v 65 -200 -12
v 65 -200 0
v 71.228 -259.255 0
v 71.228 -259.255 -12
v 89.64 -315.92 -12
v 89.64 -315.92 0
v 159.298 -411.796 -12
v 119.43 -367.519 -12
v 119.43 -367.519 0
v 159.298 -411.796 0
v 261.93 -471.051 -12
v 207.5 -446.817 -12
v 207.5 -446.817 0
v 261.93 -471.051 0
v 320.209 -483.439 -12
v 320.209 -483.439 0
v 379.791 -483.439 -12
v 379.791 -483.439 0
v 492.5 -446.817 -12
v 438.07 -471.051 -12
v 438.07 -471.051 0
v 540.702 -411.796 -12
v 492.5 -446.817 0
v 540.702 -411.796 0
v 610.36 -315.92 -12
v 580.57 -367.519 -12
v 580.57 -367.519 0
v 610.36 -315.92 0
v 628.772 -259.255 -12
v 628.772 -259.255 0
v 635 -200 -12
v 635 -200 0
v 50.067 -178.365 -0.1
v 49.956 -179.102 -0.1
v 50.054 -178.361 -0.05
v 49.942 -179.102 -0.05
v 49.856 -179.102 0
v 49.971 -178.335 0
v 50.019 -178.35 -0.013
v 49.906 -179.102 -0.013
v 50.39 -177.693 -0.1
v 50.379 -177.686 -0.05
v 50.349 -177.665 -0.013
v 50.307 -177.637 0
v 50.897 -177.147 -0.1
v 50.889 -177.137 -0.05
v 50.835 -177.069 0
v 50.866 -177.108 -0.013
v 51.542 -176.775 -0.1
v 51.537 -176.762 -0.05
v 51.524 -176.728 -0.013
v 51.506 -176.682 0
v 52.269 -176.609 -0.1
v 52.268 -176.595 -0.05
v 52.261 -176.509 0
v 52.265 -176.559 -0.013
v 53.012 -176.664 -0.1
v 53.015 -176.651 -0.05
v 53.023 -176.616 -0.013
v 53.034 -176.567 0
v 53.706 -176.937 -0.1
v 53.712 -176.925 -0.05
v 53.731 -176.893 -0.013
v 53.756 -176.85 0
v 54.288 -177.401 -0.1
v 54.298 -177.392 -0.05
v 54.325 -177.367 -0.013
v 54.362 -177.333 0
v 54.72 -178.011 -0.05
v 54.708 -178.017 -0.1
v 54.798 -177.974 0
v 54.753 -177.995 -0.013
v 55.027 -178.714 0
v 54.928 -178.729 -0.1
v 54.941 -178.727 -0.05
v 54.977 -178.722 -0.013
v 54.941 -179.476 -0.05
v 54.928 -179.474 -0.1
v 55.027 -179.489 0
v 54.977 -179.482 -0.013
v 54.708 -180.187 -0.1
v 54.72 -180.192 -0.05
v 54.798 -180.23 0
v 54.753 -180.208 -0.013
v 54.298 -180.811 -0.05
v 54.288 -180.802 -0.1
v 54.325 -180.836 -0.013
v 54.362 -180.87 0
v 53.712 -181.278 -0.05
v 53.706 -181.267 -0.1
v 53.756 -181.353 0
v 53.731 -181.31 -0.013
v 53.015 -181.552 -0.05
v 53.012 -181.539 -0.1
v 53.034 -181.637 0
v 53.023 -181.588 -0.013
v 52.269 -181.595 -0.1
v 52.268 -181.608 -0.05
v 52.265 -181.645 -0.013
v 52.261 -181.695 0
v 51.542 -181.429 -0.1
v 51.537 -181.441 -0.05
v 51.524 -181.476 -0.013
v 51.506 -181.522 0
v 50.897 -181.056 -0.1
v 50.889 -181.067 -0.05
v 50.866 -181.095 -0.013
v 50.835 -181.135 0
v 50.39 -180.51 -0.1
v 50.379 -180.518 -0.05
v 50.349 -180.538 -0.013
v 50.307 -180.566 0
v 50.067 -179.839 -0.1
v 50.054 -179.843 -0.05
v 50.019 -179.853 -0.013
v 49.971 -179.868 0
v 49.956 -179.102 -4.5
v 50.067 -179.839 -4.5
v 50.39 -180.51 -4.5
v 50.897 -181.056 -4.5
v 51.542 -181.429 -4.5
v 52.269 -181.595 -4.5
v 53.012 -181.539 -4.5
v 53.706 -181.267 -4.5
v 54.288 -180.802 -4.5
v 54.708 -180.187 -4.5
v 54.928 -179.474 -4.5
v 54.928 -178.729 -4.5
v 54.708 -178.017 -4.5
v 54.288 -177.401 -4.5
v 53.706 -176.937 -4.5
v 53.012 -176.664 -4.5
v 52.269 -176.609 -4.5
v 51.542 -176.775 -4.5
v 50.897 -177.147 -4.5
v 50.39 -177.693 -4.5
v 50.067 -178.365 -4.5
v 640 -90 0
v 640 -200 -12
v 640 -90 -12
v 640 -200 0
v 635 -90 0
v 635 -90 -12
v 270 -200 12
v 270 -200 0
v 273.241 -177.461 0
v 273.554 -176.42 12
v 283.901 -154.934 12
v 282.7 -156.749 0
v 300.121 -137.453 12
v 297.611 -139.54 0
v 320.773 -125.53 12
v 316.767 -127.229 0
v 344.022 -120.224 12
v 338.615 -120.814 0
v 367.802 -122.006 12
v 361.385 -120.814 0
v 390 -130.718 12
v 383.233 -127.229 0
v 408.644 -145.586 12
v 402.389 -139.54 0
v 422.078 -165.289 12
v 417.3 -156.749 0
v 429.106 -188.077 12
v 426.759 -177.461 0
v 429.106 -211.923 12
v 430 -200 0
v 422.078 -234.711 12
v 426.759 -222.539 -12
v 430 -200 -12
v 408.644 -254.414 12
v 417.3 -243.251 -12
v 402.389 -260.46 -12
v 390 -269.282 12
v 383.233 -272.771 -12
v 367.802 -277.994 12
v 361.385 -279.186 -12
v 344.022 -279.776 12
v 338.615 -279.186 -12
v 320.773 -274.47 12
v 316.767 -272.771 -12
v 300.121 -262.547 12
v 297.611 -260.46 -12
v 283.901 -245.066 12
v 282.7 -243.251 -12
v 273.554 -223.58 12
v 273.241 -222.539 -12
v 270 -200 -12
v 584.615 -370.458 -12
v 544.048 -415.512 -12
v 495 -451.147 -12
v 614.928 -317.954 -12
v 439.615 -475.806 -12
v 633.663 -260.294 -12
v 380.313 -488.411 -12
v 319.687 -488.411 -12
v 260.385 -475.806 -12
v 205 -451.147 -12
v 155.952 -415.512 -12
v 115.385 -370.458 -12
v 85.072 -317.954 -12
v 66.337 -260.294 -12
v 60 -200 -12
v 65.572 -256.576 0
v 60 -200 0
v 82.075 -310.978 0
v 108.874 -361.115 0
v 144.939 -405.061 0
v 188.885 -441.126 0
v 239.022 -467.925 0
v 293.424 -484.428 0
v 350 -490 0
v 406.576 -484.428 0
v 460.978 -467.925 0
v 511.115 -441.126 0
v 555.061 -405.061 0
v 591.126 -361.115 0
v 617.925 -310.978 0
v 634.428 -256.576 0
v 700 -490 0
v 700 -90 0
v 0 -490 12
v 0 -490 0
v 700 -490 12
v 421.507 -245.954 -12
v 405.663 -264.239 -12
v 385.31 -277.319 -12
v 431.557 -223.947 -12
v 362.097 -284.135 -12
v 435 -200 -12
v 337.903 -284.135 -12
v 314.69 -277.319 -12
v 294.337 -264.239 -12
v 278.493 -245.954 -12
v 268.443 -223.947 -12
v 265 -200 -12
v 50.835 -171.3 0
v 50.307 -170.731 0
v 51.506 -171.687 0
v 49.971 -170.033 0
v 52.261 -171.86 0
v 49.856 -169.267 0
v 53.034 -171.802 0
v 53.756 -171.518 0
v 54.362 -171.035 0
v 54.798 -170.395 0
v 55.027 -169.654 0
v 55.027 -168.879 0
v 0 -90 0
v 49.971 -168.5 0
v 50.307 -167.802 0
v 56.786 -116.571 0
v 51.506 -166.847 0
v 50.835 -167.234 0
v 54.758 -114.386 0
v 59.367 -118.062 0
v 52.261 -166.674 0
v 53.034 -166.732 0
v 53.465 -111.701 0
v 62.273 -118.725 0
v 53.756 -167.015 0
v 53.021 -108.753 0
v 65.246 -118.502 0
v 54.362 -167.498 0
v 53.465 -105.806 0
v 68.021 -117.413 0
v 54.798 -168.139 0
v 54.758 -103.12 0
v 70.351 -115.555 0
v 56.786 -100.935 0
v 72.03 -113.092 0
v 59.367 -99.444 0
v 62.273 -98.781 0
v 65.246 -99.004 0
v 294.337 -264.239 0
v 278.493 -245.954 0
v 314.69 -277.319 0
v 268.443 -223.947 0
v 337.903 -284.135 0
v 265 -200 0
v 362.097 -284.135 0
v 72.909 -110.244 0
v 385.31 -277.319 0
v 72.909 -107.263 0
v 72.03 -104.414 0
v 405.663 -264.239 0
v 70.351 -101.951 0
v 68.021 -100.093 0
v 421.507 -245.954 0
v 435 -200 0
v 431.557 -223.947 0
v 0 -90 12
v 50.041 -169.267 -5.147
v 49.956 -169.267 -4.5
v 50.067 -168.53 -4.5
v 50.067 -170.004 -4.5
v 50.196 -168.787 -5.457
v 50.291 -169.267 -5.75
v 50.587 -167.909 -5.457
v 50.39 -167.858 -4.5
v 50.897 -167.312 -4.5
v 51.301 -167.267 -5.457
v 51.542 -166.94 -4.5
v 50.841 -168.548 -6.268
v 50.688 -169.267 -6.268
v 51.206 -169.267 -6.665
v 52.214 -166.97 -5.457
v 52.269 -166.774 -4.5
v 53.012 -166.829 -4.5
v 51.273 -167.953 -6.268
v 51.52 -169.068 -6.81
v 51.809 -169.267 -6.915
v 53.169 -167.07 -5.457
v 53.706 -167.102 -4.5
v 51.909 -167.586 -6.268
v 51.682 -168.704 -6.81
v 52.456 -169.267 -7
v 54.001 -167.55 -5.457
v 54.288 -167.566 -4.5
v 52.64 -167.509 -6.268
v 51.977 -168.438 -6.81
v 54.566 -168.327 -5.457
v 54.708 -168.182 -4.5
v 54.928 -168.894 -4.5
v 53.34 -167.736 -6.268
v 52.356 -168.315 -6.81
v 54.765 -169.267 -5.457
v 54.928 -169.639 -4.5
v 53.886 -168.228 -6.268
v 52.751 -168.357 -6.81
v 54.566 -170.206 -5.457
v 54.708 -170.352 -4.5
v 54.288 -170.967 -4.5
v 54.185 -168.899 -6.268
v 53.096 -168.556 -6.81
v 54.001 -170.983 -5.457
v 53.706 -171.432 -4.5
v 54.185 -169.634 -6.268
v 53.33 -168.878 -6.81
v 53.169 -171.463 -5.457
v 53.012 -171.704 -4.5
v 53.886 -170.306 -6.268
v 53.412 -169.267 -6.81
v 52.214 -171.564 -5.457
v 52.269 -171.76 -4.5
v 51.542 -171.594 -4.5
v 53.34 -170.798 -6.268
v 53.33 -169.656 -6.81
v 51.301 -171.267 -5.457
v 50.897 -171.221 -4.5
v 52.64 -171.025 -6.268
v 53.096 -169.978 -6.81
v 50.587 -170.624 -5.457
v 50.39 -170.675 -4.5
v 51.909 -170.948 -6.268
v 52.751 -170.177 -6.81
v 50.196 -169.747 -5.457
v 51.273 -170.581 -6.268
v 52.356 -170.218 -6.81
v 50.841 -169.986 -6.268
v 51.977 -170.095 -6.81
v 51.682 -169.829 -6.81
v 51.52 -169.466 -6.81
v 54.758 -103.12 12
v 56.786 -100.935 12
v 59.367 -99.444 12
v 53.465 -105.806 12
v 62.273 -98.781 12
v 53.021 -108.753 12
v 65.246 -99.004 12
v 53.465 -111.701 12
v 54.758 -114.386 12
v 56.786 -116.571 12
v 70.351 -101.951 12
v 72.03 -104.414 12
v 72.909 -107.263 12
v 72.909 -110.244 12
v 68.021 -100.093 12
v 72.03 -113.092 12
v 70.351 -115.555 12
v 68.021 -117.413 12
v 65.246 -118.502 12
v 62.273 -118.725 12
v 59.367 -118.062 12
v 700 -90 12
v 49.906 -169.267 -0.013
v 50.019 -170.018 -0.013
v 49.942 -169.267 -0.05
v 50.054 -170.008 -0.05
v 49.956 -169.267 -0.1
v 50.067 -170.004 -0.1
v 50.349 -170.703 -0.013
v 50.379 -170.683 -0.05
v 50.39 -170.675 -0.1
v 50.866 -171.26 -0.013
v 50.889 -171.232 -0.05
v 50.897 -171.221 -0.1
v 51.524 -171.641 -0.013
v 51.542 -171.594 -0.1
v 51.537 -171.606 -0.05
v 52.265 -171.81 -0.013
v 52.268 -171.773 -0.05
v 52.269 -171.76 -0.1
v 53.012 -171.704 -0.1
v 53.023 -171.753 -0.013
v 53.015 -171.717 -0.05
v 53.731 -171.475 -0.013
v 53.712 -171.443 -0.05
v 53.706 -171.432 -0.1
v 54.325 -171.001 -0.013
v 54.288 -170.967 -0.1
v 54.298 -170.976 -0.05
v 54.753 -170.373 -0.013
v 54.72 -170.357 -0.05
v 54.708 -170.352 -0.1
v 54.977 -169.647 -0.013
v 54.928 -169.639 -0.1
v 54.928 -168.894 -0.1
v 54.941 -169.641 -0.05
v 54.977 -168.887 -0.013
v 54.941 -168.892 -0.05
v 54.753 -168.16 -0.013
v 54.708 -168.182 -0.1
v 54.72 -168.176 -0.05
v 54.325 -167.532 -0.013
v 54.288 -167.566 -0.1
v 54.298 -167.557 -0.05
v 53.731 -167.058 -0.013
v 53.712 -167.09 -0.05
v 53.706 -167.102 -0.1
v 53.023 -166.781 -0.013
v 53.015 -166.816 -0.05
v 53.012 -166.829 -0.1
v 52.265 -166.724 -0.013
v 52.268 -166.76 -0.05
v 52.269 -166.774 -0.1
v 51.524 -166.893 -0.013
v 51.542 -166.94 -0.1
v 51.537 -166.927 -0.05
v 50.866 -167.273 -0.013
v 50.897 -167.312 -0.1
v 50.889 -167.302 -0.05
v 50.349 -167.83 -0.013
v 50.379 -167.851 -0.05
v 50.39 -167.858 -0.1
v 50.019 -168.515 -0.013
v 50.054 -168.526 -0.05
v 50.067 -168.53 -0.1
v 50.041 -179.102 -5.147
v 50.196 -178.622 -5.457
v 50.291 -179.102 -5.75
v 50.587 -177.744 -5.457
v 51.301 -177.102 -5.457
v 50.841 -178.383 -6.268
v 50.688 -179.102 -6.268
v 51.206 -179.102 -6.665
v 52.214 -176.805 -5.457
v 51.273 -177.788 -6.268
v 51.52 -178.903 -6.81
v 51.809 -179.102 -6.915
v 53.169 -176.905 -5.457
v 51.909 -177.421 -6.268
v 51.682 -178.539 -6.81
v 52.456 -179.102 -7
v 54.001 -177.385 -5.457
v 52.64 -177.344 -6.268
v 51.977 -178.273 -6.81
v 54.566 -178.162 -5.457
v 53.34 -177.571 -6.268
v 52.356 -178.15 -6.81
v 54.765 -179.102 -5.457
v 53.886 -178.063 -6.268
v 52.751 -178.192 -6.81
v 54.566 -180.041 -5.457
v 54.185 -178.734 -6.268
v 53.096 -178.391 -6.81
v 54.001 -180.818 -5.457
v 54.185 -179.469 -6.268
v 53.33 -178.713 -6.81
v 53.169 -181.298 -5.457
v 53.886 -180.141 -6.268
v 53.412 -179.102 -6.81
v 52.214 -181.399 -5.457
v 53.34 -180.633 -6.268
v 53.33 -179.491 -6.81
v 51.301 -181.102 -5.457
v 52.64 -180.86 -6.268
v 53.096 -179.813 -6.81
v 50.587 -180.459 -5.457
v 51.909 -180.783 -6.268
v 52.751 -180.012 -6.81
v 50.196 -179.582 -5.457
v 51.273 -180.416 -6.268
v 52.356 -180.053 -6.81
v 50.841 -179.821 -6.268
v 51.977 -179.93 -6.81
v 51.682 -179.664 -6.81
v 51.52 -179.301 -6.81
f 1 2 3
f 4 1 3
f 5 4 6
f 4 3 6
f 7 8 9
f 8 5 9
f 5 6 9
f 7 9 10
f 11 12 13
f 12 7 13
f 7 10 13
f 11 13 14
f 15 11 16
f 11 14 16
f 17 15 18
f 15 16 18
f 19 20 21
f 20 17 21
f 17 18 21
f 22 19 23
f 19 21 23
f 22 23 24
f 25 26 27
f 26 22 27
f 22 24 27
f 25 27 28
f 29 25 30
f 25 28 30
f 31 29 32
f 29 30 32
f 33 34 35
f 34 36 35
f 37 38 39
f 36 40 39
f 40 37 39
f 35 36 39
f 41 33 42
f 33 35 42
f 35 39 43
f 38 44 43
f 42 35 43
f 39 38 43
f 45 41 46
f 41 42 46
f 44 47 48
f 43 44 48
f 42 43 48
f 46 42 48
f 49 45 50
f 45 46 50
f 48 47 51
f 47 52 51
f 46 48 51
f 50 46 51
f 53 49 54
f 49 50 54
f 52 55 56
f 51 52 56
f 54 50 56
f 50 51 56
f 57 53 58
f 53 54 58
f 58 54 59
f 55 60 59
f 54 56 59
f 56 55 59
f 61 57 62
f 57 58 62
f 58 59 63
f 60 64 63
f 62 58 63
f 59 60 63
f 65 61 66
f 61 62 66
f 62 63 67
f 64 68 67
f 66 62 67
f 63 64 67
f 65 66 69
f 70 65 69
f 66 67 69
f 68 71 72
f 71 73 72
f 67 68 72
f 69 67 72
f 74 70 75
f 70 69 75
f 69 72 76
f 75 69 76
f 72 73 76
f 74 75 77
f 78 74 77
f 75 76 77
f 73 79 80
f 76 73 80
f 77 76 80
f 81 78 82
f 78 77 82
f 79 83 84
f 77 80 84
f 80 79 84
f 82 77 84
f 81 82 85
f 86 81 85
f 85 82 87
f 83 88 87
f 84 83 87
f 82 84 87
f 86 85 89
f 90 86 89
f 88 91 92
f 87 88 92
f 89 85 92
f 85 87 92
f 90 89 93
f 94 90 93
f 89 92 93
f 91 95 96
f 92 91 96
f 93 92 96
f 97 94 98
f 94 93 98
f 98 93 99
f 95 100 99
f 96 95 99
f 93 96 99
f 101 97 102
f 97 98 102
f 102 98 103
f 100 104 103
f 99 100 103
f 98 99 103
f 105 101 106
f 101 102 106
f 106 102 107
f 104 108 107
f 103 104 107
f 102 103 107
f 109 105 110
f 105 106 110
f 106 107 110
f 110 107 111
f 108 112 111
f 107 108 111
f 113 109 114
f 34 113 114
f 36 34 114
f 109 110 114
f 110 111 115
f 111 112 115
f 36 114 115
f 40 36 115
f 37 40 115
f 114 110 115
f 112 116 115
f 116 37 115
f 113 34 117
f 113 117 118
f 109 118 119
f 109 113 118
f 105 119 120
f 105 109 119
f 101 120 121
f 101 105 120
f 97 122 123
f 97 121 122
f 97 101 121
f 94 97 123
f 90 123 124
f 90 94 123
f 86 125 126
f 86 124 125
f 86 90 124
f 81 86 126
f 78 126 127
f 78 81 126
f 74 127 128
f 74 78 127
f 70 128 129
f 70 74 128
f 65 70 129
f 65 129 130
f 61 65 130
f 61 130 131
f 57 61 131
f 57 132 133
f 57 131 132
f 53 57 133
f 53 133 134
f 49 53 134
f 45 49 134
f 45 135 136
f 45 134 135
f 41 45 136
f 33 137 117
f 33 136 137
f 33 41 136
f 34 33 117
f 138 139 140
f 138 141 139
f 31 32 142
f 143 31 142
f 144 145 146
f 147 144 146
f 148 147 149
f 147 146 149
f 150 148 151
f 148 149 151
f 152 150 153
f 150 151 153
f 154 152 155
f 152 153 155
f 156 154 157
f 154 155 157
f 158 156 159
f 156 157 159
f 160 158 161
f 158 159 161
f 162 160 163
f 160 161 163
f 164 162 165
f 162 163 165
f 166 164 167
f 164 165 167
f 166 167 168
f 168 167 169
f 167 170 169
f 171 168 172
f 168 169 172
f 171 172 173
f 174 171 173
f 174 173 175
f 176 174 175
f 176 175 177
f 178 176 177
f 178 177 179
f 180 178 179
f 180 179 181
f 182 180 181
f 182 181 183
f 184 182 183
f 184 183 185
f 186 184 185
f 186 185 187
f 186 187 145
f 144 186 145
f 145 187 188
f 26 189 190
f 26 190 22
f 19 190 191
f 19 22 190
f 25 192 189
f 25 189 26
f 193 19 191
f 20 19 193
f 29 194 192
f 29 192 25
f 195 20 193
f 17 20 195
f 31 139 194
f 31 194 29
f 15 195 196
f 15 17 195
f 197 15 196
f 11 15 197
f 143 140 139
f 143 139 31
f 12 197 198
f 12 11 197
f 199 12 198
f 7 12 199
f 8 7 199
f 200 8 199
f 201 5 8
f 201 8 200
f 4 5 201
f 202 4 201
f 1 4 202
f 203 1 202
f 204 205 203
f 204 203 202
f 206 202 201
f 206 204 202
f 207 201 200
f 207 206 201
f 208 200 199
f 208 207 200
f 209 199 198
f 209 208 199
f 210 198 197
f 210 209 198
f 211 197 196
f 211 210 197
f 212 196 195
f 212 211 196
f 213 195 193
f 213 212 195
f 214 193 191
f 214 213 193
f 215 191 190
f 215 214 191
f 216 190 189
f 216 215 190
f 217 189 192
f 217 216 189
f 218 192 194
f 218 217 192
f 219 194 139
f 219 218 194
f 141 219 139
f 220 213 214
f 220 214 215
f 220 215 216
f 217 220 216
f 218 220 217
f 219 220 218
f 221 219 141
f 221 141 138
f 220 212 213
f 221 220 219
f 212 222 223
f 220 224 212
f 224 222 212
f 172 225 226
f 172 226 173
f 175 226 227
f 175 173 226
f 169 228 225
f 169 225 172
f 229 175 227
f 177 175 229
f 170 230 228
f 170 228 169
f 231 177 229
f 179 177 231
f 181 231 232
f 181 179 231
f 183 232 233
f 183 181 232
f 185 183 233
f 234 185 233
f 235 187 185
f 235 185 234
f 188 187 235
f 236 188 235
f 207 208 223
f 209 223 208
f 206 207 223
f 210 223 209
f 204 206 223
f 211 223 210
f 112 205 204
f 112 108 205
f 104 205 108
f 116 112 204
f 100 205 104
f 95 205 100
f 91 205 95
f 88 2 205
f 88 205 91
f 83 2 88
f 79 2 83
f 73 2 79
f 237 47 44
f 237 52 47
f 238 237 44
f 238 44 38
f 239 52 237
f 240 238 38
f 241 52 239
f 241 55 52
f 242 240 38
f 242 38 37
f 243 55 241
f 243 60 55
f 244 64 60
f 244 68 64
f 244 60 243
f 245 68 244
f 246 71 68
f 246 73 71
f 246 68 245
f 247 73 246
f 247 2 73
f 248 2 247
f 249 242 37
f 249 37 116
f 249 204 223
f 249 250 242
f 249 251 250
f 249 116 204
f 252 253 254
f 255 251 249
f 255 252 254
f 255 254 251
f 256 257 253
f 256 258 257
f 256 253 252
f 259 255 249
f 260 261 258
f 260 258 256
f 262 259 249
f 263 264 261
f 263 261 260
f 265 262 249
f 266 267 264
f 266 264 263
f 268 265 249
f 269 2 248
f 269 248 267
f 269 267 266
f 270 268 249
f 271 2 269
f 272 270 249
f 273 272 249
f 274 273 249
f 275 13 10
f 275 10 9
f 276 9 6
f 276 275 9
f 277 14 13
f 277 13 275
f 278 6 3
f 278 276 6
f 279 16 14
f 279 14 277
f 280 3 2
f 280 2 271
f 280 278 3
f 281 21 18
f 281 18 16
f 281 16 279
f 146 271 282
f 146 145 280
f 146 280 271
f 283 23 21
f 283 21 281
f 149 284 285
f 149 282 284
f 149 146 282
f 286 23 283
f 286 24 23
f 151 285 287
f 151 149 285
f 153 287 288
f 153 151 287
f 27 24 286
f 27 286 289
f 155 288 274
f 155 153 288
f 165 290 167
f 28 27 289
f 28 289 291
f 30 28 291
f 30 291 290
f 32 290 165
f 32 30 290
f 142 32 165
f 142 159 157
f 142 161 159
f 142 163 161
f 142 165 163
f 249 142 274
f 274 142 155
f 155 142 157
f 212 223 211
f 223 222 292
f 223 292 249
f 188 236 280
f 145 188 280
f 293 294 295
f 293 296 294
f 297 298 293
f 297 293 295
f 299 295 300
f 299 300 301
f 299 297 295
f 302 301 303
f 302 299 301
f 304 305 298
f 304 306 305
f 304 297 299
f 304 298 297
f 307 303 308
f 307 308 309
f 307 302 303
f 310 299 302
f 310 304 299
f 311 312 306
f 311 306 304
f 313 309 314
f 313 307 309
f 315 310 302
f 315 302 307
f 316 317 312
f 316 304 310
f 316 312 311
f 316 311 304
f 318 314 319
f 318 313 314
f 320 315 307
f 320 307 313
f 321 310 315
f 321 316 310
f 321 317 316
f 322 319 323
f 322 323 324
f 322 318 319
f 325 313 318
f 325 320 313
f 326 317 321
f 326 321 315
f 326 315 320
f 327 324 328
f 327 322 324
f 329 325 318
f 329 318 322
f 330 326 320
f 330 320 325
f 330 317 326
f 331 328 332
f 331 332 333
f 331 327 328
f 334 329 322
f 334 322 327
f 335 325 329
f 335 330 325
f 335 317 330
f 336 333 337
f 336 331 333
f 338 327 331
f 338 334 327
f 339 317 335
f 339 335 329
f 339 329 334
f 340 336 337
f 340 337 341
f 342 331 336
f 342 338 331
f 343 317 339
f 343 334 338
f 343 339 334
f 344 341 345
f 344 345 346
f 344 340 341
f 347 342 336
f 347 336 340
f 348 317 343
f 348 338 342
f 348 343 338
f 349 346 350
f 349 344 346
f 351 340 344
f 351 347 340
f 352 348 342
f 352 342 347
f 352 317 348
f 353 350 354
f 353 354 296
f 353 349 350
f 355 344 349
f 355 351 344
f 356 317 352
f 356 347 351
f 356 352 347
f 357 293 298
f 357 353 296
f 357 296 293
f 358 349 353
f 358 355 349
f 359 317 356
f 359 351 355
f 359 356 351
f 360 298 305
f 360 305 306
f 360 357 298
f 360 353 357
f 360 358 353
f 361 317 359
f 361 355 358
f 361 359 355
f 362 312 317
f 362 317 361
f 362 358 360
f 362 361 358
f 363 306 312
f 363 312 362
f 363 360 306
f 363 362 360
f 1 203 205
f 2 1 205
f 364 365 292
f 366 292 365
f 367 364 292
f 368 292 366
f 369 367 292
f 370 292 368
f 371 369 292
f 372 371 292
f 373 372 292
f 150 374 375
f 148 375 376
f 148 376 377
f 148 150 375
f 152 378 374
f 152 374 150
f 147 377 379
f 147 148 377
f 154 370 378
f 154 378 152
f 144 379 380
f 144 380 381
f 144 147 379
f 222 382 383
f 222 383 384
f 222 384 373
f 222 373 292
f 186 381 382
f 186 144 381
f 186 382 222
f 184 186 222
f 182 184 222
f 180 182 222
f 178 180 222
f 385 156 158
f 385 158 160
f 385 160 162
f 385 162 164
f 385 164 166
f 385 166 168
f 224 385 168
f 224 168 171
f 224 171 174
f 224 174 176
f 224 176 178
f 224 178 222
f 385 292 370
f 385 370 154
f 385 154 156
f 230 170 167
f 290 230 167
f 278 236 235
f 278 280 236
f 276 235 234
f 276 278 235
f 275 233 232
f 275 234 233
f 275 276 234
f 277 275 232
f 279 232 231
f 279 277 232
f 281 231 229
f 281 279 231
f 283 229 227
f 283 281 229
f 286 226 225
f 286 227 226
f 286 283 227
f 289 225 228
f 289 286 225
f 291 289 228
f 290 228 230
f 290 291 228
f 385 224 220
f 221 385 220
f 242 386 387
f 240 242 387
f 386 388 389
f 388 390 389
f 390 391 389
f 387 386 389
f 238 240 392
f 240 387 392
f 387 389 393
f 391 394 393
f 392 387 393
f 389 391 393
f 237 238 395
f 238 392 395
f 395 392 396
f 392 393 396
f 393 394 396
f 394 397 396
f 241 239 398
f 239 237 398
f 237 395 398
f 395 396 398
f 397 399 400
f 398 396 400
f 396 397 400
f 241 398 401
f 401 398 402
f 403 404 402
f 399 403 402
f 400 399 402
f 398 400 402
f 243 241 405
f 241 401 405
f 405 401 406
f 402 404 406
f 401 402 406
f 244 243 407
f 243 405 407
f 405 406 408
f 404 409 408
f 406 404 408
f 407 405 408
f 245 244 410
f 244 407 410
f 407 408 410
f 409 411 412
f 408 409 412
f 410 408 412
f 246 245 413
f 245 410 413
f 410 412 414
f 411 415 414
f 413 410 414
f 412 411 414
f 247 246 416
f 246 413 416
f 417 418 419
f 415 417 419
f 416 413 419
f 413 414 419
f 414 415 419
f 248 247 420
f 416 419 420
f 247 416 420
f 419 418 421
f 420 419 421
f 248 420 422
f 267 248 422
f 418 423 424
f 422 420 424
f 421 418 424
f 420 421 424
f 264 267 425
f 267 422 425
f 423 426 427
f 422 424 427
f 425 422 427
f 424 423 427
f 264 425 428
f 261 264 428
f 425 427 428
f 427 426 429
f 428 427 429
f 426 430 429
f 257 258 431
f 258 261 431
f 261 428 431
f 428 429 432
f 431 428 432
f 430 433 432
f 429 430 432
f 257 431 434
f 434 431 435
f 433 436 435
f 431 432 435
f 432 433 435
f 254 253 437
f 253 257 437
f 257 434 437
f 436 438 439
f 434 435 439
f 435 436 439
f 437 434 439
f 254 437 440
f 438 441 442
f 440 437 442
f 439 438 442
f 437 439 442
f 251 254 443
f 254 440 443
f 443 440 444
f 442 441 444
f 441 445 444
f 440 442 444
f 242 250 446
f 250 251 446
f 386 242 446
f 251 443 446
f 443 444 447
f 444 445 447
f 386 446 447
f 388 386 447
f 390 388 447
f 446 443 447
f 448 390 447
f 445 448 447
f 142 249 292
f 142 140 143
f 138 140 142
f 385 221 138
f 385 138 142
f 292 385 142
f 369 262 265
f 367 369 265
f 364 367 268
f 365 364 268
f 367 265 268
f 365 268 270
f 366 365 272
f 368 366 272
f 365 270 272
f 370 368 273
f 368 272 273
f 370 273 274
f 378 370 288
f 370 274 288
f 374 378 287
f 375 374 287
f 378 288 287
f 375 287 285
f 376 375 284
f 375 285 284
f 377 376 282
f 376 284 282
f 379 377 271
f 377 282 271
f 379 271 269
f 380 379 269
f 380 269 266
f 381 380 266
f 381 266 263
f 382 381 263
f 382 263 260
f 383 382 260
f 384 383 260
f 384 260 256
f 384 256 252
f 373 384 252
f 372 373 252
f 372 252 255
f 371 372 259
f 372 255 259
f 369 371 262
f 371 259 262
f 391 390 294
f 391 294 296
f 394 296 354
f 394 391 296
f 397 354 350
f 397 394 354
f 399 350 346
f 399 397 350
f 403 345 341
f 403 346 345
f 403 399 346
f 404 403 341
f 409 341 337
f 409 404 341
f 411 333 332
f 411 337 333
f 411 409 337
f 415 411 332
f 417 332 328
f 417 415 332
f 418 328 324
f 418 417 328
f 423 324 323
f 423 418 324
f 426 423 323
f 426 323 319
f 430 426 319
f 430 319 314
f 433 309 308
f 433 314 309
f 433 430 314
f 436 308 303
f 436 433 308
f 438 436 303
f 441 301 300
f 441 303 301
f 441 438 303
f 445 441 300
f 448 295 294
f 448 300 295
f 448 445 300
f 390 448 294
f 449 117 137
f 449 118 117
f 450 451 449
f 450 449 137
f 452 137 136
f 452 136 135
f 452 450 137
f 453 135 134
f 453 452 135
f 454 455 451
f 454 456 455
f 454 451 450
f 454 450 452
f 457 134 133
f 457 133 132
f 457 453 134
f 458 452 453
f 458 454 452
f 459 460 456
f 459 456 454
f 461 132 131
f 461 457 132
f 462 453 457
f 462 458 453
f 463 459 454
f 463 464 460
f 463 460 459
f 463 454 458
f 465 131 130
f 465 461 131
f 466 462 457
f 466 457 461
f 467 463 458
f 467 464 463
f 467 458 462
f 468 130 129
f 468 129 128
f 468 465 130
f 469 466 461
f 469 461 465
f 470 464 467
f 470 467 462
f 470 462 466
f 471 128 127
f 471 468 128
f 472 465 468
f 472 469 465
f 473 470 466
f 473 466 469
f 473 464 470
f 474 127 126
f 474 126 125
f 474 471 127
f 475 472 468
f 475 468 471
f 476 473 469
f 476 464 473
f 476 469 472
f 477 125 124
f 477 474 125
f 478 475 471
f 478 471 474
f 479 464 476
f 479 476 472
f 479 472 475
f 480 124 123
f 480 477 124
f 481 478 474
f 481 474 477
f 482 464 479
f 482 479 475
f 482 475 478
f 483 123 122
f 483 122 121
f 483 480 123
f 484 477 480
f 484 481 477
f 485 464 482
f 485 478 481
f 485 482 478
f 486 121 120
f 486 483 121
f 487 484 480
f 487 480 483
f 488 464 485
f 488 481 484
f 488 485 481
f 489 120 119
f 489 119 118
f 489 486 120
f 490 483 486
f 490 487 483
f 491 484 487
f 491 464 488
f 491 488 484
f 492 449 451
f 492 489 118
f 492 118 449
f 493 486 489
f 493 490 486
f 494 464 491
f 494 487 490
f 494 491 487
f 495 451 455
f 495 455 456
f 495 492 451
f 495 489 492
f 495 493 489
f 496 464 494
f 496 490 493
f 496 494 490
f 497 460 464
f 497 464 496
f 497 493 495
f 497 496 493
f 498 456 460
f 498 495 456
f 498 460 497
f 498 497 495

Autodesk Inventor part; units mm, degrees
ref_plane "YZ Plane" through (0, 0, 0) normal (1, 0, 0) x (0, 1, 0)
ref_plane "XZ Plane" through (0, 0, 0) normal (0, 1, 0) x (-1, 0, 0)
ref_plane "XY Plane" through (0, 0, 0) normal (0, 0, 1) x (1, 0, 0)
sketch "Sketch1" plane through (0, 0, 0) normal (0, 0, 1) x (1, 0, 0)
  line L0 (0, 0) -> (700, 0)
  line L1 (700, 0) -> (700, -400)
  line L2 (700, -400) -> (0, -400)
  line L3 (0, -400) -> (0, 0)
  dimension "d0" = 700
  dimension "d1" = 400
extrude "Extrusion1" add sketch "Sketch1" along normal blind 12
sketch "Sketch2" plane through (0, 0, 0) normal (0, 0, -1) x (-1, 0, 0)
  circle A0 centre (-350, -200) radius 80
  point P0 (0, 0)
  dimension "d4" = 160
extrude "Extrusion2" cut sketch "Sketch2" against normal blind 12
sketch "Sketch3" plane through (0, 0, 0) normal (0, 0, -1) x (-1, 0, 0)
  arc A0 (-430, -200) -> (-270, -200) centre (-350, -200) ccw
  line L0 (-270, -200) -> (-270, 0)
  line L1 (-430, -200) -> (-430, 0)
  line L2 (-265, 0) -> (-265, -200)
  arc A1 (-435, -200) -> (-265, -200) centre (-350, -200) ccw
  line L3 (-435, -200) -> (-435, 0)
  line L4 (-65, 0) -> (-65, -200)
  arc A2 (-635, -200) -> (-65, -200) centre (-350, -200) ccw
  line L5 (-635, -200) -> (-635, 0)
  line L6 (-60, 0) -> (-60, -200)
  arc A3 (-640, -200) -> (-60, -200) centre (-350, -200) ccw
  line L7 (-640, -200) -> (-640, 0)
  line L8 (-60, 0) -> (-65, 0)
  line L9 (-700, 0) -> (0, 0) projected
  line L10 (-430, 0) -> (-435, 0)
  line L11 (-635, 0) -> (-640, 0)
  line L12 (-265, 0) -> (-270, 0)
  dimension "d7" = 5
  dimension "d8" = 200
  dimension "d9" = 5
extrude "Extrusion3" add sketch "Sketch3" along normal blind 12 contours A0 L0 L9 L2 A1 L3 L1 | L5 A2 L4 L8 L6 A3 L7 L9
sketch "Sketch4" plane through (700, -400, 0) normal (1, 0, 0) x (0, 0, -1)
  line L0 (0, 0) -> (-12, 0) projected
  line L1 (0, 0) -> (-12, 0)
  line L2 (-12, 0) -> (-12, -90)
  line L3 (-12, -90) -> (0, -90)
  line L4 (0, -90) -> (0, 0)
  point P0 (0, 400)
  dimension "d12" = 90
extrude "Extrusion4" add sketch "Sketch4" against normal blind 700
sketch "Sketch5" plane through (700, 0, 12) normal (1, 0, 0) x (0, 0, -1)
  line L0 (12, 0) -> (0, 0) projected
  line L1 (0, 0) -> (88.8281, 0)
  line L2 (88.8281, 0) -> (88.8281, -90)
  line L3 (88.8281, -90) -> (0, -90)
  line L4 (0, -90) -> (0, 0)
  dimension "d15" = 90
extrude "Extrusion5" cut sketch "Sketch5" against normal blind 10000
sketch "Sketch6" plane through (0, -490, 0) normal (-1, 0, 0) x (0, 0, 1)
  line L0 (0, 290) -> (0, 400) projected
  line L1 (0, 400) -> (-31.175, 400)
  line L2 (-31.175, 400) -> (-31.175, 290)
  line L3 (-31.175, 290) -> (0, 290)
  line L4 (0, 290) -> (0, 400)
  point P0 (0, 490)
extrude "Extrusion6" cut sketch "Sketch6" against normal blind 500
sketch "Sketch7" plane through (0, 0, 0) normal (0, 0, -1) x (-1, 0, 0)
  circle A0 centre (-52.4557, -179.1018) radius 2.5
  circle A1 centre (-52.4557, -169.2668) radius 2.5
  point P0 (0, 0)
  dimension "d20" = 5
  dimension "d21" = 5
extrude "Extrusion7" add sketch "Sketch7" along normal blind 7
fillet "Fillet1" radius 2.5 2 edges at (54.9557, -169.2668, -7) (54.9557, -179.1018, -7)
fillet "Fillet2" radius 0.1 2 edges at (54.9557, -169.2668, 0) (54.9557, -179.1018, 0)
sketch "Sketch8" plane through (0, 0, 0) normal (0, 0, -1) x (-1, 0, 0)
  circle A0 centre (-63.0207, -108.7531) radius 10
  point P0 (0, 0)
  dimension "d26" = 20
extrude "Extrusion8" cut sketch "Sketch8" against normal blind 20
equation "\"BendRadius\" = Thickness"
equation "\"BendReliefWidth\" = Thickness"
equation "\"BendReliefDepth\" = 0.5 * Thickness"
equation "\"CornerReliefSize\" = 4 * Thickness"
equation "\"MinimumRemnant\" = 2 * Thickness"
equation "\"TransitionRadius\" = BendRadius"
equation "\"JacobiRadiusSize\" = BendRadius"
equation "\"GapSize\" = Thickness"
equation "\"Thickness\" = 0.5"
properties part number "base" material "Acetal Resin, White"
